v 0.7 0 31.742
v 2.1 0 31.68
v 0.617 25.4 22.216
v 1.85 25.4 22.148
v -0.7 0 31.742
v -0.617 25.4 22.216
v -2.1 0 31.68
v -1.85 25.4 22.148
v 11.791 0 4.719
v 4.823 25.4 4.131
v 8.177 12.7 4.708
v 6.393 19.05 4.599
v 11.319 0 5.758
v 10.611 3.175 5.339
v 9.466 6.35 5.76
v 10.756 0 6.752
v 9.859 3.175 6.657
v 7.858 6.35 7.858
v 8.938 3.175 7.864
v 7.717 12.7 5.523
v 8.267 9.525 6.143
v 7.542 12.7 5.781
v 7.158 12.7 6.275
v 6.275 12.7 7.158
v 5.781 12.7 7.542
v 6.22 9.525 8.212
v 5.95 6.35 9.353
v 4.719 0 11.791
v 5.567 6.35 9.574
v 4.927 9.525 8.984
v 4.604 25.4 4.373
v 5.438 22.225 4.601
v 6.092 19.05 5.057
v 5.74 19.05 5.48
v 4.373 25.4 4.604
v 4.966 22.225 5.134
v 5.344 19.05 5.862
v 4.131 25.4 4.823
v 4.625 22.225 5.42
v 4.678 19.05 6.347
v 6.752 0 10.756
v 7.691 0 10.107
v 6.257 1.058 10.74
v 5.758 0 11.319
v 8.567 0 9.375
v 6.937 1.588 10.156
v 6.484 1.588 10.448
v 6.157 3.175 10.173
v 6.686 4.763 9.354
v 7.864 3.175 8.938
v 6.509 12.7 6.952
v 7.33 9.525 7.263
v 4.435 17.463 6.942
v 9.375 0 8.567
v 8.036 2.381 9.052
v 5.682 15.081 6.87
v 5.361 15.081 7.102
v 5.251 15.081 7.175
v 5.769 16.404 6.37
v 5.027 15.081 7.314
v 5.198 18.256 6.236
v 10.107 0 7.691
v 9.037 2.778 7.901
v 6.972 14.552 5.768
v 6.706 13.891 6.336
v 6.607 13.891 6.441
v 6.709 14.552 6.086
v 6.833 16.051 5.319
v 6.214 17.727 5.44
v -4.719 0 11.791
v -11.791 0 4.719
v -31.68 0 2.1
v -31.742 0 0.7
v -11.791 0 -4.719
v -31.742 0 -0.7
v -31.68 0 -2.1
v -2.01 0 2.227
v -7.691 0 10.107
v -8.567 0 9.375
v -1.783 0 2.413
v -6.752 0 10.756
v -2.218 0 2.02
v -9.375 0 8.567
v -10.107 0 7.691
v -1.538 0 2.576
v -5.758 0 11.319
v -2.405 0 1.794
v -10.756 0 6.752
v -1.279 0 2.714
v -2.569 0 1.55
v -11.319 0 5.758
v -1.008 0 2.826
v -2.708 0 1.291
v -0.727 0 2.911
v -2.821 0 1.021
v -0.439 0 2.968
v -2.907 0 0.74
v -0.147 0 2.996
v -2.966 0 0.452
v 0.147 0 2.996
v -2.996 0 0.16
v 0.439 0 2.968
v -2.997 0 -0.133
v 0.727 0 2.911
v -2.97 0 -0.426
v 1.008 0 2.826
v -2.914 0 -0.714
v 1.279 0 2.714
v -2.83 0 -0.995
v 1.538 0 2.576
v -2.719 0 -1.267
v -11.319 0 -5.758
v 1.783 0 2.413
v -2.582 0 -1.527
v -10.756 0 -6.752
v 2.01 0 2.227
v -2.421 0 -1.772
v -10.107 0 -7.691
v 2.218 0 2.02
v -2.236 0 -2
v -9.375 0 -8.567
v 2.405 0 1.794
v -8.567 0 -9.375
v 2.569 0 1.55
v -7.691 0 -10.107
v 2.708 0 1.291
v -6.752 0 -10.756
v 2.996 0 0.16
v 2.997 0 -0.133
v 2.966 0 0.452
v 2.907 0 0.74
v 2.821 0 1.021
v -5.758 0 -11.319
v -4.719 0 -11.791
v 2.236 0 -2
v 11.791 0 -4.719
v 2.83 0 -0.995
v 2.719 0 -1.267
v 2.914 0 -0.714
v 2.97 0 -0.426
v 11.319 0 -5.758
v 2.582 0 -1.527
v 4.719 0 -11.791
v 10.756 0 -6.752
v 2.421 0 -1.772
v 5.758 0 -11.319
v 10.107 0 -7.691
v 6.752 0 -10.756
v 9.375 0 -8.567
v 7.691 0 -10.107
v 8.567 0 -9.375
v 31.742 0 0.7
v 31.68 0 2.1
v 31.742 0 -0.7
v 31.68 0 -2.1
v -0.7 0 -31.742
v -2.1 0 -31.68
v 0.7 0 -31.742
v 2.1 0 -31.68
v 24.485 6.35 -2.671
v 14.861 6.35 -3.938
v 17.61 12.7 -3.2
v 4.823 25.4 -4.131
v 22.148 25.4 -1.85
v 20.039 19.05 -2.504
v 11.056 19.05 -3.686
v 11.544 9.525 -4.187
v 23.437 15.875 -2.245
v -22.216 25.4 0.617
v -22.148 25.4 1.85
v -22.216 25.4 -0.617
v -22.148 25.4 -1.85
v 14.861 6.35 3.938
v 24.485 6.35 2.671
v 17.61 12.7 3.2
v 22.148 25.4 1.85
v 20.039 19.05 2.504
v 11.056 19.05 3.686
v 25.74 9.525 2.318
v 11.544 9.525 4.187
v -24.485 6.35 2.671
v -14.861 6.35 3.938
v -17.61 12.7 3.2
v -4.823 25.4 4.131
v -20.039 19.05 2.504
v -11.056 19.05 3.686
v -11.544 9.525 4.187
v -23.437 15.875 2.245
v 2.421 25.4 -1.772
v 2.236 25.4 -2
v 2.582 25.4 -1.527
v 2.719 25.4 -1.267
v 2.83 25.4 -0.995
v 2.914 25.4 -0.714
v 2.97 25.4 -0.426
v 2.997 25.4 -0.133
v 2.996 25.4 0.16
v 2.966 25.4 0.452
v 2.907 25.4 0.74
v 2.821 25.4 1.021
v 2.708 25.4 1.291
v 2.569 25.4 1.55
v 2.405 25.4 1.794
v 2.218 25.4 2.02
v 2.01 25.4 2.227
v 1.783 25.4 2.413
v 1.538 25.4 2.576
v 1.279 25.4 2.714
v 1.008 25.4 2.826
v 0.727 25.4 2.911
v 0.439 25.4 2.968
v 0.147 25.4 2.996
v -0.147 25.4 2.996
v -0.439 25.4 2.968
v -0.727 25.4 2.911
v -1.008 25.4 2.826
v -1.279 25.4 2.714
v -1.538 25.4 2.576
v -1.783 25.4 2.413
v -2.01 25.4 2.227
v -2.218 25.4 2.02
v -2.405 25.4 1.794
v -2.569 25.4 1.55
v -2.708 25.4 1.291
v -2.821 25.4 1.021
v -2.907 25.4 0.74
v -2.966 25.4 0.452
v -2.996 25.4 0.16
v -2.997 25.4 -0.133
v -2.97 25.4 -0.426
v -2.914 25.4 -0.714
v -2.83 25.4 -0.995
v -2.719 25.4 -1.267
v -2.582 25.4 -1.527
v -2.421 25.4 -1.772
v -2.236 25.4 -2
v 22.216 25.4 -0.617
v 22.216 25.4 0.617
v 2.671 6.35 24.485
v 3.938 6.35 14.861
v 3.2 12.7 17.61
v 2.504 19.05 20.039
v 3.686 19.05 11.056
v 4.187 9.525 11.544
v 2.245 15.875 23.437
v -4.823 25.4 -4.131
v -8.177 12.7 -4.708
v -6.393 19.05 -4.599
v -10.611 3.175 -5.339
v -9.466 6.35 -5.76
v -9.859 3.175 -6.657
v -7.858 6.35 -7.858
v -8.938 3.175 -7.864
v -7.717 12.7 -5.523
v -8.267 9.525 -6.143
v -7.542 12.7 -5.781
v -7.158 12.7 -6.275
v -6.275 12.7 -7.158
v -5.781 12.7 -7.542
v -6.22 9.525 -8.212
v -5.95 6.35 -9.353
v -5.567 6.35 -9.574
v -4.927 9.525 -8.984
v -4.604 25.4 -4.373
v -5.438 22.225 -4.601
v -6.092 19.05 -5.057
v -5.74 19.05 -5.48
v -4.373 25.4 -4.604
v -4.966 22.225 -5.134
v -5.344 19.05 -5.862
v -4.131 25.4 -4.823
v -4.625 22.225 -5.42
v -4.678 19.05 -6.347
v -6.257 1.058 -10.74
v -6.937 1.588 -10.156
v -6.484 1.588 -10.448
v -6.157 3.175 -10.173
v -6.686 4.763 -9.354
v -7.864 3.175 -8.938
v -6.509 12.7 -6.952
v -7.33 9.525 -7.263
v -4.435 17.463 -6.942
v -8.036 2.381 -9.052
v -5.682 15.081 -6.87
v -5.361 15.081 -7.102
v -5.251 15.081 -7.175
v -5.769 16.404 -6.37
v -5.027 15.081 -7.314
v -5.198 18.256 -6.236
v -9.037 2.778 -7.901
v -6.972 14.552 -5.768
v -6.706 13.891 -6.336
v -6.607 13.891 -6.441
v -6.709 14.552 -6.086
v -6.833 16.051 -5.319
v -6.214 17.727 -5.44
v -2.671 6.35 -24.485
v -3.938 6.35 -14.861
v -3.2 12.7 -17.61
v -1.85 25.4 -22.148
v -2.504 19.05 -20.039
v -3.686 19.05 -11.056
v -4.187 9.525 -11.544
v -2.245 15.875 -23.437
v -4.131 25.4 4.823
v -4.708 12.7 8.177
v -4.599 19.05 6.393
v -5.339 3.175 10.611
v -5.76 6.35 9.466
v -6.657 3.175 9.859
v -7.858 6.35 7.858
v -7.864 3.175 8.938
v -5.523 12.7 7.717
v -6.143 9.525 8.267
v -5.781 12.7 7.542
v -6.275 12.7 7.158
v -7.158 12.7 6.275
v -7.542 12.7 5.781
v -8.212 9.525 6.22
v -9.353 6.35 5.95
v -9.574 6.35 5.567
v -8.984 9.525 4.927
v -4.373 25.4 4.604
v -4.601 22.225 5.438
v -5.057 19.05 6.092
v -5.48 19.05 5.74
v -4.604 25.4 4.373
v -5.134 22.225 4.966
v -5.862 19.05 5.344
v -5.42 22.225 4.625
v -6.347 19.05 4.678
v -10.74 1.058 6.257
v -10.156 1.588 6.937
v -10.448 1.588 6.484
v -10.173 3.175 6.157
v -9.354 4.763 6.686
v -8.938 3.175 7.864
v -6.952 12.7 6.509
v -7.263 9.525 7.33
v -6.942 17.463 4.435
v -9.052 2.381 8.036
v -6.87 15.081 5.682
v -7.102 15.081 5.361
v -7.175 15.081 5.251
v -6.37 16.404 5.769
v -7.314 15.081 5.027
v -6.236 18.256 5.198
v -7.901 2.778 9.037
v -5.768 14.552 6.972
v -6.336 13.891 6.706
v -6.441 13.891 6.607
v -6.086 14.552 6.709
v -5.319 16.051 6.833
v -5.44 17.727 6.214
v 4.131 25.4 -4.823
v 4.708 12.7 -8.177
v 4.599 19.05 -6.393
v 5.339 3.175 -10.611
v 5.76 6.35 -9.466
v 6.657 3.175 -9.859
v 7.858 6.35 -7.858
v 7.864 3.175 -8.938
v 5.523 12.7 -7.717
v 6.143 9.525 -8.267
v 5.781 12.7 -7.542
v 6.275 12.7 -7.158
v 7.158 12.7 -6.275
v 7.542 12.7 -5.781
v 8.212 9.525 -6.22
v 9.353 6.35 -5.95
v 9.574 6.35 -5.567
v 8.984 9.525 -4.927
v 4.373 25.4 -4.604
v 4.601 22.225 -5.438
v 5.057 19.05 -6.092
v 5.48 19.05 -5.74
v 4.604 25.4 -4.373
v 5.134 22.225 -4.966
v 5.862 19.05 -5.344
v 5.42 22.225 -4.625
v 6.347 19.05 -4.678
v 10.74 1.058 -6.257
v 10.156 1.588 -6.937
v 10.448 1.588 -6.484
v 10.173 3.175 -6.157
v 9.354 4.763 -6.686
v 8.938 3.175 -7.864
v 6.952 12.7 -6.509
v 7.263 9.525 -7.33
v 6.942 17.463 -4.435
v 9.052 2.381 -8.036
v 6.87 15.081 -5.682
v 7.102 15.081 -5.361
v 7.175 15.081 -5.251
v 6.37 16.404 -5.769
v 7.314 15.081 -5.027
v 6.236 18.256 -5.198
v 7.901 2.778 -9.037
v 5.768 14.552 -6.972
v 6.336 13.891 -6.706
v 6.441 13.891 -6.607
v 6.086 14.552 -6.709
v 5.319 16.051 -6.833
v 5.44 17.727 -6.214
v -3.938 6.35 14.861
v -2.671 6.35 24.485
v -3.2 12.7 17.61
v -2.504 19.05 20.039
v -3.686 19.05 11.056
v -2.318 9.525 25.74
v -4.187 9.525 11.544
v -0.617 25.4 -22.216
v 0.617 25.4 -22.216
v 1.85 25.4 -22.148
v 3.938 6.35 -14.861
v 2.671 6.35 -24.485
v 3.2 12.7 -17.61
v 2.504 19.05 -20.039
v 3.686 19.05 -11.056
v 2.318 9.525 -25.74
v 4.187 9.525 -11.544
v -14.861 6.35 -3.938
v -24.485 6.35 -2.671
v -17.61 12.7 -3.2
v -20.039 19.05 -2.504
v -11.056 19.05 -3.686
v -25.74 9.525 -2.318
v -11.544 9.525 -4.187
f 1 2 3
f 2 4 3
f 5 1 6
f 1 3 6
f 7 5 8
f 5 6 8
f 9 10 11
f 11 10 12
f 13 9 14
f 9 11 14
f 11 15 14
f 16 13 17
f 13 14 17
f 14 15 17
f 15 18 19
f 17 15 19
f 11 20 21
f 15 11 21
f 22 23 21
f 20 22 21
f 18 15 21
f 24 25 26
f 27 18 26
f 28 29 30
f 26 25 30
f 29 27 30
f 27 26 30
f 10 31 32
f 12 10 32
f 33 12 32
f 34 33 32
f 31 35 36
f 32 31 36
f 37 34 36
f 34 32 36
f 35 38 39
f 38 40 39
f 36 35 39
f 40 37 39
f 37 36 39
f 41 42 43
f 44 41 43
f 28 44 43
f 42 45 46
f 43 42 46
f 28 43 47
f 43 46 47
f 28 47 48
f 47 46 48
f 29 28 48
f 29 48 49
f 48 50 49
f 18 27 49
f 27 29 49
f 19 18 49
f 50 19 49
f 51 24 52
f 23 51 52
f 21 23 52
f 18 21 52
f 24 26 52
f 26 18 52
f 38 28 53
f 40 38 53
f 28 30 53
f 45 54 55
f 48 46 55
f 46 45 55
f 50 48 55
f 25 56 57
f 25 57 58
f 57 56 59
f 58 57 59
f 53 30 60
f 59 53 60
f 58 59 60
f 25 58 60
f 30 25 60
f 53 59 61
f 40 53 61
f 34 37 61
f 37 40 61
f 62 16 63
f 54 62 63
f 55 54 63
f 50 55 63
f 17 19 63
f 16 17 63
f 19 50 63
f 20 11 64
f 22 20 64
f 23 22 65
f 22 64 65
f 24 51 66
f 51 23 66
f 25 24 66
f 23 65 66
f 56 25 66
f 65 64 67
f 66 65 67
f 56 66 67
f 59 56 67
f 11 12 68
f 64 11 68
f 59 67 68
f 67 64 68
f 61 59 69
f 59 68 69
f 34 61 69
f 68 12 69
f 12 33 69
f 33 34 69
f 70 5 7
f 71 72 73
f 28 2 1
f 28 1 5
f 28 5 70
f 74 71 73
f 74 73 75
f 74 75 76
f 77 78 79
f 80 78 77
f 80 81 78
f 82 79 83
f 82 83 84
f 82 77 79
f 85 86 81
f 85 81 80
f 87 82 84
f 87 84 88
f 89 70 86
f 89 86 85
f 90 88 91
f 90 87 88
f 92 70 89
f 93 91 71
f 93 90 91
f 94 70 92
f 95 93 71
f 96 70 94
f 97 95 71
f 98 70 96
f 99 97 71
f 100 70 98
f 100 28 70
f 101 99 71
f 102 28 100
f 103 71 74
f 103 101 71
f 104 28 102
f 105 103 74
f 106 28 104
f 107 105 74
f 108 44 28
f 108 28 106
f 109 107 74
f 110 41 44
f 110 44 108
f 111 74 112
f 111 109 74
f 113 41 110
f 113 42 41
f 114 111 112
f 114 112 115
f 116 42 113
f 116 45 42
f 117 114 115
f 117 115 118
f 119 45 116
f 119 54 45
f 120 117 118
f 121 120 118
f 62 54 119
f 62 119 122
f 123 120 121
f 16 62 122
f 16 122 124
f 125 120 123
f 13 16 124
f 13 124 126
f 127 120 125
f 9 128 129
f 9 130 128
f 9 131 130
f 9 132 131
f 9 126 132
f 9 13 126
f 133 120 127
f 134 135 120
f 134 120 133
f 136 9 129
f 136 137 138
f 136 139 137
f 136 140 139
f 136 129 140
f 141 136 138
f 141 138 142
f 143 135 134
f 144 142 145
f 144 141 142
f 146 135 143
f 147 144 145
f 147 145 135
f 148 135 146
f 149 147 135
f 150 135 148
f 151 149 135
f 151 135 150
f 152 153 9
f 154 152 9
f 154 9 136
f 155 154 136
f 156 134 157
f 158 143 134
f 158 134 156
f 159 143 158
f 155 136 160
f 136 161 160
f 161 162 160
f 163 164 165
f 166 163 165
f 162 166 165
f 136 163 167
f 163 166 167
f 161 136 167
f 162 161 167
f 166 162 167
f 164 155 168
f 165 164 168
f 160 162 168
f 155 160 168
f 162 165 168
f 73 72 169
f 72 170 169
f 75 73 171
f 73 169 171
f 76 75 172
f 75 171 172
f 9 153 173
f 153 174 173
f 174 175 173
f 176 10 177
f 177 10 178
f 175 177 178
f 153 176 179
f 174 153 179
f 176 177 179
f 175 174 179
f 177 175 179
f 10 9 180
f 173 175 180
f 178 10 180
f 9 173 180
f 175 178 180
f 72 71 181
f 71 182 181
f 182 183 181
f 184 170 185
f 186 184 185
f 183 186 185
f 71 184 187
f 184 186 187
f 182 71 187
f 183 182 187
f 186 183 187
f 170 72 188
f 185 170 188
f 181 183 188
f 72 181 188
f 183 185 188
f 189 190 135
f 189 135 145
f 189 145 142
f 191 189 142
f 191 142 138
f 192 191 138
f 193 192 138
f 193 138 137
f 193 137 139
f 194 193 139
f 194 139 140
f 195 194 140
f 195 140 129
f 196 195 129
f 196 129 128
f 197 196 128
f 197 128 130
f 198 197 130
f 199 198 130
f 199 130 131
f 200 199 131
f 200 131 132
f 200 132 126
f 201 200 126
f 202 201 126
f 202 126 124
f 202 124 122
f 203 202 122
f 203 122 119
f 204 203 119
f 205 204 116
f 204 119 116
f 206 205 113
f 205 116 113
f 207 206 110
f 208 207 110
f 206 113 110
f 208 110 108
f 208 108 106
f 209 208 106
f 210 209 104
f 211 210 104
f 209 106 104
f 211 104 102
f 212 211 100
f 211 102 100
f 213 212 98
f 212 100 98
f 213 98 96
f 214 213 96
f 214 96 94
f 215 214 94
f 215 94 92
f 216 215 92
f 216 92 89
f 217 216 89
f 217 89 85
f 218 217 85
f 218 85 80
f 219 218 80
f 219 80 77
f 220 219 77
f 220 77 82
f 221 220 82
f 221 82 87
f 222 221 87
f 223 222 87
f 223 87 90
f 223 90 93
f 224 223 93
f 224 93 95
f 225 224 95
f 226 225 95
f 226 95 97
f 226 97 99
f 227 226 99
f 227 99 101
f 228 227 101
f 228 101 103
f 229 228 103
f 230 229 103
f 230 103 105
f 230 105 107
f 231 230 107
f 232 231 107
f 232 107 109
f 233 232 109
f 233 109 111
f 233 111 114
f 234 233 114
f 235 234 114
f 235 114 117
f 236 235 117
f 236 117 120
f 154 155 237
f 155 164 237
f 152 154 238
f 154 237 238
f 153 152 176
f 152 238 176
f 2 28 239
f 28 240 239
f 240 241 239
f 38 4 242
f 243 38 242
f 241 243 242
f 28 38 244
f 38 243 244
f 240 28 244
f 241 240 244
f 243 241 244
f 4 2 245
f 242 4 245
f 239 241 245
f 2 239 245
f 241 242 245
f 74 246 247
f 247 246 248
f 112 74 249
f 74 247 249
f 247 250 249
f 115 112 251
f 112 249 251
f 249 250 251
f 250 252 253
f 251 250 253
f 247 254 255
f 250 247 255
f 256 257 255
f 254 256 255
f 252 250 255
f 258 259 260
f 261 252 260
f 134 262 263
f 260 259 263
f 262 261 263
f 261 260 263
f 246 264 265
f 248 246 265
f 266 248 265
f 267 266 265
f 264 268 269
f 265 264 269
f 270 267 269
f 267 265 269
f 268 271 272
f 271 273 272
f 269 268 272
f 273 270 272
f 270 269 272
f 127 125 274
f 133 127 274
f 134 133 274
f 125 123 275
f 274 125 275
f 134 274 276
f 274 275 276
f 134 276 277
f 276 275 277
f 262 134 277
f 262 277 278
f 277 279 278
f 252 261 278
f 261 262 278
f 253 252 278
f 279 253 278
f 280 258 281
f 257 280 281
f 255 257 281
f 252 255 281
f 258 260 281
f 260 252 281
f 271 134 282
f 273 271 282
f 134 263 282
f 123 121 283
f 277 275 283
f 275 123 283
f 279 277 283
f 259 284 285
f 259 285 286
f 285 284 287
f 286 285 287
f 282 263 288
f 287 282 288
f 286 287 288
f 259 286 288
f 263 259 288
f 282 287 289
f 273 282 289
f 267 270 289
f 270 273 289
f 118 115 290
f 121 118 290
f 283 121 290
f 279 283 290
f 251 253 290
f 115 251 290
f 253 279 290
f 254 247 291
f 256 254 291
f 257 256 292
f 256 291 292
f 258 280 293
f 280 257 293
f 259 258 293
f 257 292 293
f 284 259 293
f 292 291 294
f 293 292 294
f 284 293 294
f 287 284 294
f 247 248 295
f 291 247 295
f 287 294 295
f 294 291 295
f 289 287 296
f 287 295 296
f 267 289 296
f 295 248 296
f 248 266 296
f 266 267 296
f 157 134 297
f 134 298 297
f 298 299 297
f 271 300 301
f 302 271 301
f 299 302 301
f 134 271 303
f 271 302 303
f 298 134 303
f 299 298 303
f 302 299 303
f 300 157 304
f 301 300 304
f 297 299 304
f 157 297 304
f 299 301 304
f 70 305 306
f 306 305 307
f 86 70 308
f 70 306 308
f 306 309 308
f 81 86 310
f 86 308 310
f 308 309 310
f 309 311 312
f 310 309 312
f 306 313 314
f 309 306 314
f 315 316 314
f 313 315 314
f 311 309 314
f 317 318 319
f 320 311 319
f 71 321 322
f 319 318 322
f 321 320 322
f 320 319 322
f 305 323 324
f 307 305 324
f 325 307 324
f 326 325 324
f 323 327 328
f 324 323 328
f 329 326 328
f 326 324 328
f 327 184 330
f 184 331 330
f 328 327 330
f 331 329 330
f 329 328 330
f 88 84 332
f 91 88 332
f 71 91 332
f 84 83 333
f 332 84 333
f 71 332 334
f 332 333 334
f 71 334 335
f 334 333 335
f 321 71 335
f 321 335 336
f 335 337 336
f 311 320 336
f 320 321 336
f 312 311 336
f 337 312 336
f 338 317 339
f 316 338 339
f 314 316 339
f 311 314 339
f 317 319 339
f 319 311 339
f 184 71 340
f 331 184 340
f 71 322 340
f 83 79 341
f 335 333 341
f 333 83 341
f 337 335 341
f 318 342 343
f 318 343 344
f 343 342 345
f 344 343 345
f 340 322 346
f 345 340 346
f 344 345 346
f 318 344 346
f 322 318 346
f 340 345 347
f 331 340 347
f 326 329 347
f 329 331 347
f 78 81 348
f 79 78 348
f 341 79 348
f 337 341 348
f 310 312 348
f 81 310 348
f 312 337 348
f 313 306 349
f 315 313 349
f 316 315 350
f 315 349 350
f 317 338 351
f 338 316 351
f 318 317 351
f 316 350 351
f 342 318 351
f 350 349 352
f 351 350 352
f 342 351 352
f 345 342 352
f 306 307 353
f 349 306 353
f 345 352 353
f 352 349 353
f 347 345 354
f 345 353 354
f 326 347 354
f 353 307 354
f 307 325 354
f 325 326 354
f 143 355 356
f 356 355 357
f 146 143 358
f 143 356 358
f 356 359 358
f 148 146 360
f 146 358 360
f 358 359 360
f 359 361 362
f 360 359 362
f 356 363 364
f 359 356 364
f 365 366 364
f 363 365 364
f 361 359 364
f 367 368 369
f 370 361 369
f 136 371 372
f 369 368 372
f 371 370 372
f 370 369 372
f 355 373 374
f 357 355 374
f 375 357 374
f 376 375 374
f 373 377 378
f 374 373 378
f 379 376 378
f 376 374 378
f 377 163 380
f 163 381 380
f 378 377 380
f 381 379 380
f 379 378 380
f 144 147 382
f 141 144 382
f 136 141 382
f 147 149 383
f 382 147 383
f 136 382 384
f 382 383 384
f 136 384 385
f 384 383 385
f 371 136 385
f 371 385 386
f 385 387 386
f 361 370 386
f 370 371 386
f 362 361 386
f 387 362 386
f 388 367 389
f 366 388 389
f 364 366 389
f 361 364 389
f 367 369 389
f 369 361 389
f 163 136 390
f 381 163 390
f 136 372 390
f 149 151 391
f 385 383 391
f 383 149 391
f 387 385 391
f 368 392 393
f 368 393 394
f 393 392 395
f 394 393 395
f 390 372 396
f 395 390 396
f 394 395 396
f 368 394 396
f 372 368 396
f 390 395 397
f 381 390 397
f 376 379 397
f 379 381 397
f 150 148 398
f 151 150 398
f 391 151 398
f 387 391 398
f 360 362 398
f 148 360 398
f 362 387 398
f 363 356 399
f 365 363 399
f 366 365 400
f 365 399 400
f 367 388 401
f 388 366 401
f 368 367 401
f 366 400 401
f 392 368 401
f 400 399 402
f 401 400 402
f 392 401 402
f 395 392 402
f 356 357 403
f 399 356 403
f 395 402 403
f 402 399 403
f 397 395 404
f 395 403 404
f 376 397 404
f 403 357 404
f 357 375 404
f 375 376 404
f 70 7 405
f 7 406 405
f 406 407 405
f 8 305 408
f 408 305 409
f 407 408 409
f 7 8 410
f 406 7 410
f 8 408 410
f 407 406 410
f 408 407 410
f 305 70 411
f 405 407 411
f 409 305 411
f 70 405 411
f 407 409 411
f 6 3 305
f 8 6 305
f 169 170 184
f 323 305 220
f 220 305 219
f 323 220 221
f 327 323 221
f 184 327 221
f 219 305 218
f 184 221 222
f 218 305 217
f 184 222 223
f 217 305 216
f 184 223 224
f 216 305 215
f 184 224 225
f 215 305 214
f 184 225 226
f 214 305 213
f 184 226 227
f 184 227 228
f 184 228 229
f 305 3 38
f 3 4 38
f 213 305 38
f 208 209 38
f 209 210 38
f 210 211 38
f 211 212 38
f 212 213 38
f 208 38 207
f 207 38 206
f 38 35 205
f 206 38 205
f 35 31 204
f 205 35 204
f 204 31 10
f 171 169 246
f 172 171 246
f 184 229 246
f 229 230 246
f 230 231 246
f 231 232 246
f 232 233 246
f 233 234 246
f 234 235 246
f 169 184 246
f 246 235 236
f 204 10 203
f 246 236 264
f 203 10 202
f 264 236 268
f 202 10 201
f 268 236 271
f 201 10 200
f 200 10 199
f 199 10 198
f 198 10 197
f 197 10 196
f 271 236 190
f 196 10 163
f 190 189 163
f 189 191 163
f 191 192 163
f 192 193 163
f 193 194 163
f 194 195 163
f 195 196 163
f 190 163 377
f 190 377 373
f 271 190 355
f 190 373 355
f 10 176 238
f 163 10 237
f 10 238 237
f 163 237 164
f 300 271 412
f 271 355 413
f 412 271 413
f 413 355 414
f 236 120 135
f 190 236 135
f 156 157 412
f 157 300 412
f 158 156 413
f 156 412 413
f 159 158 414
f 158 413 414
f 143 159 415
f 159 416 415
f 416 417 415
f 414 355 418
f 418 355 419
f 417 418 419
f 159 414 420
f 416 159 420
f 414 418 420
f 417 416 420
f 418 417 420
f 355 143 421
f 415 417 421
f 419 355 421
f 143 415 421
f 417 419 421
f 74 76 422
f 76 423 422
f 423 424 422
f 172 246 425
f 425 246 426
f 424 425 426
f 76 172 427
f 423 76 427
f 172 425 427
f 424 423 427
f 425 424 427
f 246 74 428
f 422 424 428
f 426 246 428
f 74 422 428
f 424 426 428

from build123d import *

# Parameters (mm, degrees)
CUT_EXTRUDE1_DEPTH      = 26.4000001
CUT_EXTRUDE1_DEPTH_BACK = 1.0000001


with BuildPart() as part:
    # Sketch2 → Loft1 section 0
    with BuildSketch(Plane(origin=(0, 0, 0), x_dir=(1, 0, 0), z_dir=(0, 1, 0))):
        with BuildLine():
            Line((-4.71851035, 11.790914302), (-2.1, 31.68047506))
            ThreePointArc((-2.1, 31.68047506), (0, 31.75), (2.1, 31.68047506))
            Line((2.1, 31.68047506), (4.71851035, 11.790914302))
            ThreePointArc((4.71851035, 11.790914302), (8.980256121, 8.980256121), (11.790914302, 4.71851035))
            Line((11.790914302, 4.71851035), (31.68047506, 2.1))
            ThreePointArc((31.68047506, 2.1), (31.75, 0), (31.68047506, -2.1))
            Line((31.68047506, -2.1), (11.790914302, -4.71851035))
            ThreePointArc((11.790914302, -4.71851035), (8.980256121, -8.980256121), (4.71851035, -11.790914302))
            Line((4.71851035, -11.790914302), (2.1, -31.68047506))
            ThreePointArc((2.1, -31.68047506), (0, -31.75), (-2.1, -31.68047506))
            Line((-2.1, -31.68047506), (-4.71851035, -11.790914302))
            ThreePointArc((-4.71851035, -11.790914302), (-8.980256121, -8.980256121), (-11.790914302, -4.71851035))
            Line((-11.790914302, -4.71851035), (-31.68047506, -2.1))
            ThreePointArc((-31.68047506, -2.1), (-31.75, 0), (-31.68047506, 2.1))
            Line((-31.68047506, 2.1), (-11.790914302, 4.71851035))
            ThreePointArc((-11.790914302, 4.71851035), (-8.980256121, 8.980256121), (-4.71851035, 11.790914302))
        make_face()
    # Sketch5 → Loft1 section 1
    with BuildSketch(Plane(origin=(0, 25.4, 0), x_dir=(1, 0, 0), z_dir=(0, 1, 0))):
        with BuildLine():
            Line((-4.13090623, 4.822666661), (-1.85, 22.147869536))
            ThreePointArc((-1.85, 22.147869536), (0, 22.225), (1.85, 22.147869536))
            Line((1.85, 22.147869536), (4.13090623, 4.822666661))
            ThreePointArc((4.13090623, 4.822666661), (4.490128061, 4.490128061), (4.822666661, 4.13090623))
            Line((4.822666661, 4.13090623), (22.147869536, 1.85))
            ThreePointArc((22.147869536, 1.85), (22.225, 0), (22.147869536, -1.85))
            Line((22.147869536, -1.85), (4.822666661, -4.13090623))
            ThreePointArc((4.822666661, -4.13090623), (4.490128061, -4.490128061), (4.13090623, -4.822666661))
            Line((4.13090623, -4.822666661), (1.85, -22.147869536))
            ThreePointArc((1.85, -22.147869536), (0, -22.225), (-1.85, -22.147869536))
            Line((-1.85, -22.147869536), (-4.13090623, -4.822666661))
            ThreePointArc((-4.13090623, -4.822666661), (-4.490128061, -4.490128061), (-4.822666661, -4.13090623))
            Line((-4.822666661, -4.13090623), (-22.147869536, -1.85))
            ThreePointArc((-22.147869536, -1.85), (-22.225, 0), (-22.147869536, 1.85))
            Line((-22.147869536, 1.85), (-4.822666661, 4.13090623))
            ThreePointArc((-4.822666661, 4.13090623), (-4.490128061, 4.490128061), (-4.13090623, 4.822666661))
        make_face()
    loft()

    # Sketch2<3> → Cut-Extrude1 (cut, two sides)
    with BuildSketch(Plane(origin=(0, 0, 0), x_dir=(1, 0, 0), z_dir=(0, 1, 0))) as cut_extrude1_sk:
        with BuildLine():
            ThreePointArc((2.236067977, 2), (0, -3), (-2.236067977, 2))
            Line((-2.236067977, 2), (2.236067977, 2))
        make_face()
    extrude(amount=CUT_EXTRUDE1_DEPTH, mode=Mode.SUBTRACT)
    extrude(cut_extrude1_sk.sketch, amount=-CUT_EXTRUDE1_DEPTH_BACK, mode=Mode.SUBTRACT)


solid = part.part
